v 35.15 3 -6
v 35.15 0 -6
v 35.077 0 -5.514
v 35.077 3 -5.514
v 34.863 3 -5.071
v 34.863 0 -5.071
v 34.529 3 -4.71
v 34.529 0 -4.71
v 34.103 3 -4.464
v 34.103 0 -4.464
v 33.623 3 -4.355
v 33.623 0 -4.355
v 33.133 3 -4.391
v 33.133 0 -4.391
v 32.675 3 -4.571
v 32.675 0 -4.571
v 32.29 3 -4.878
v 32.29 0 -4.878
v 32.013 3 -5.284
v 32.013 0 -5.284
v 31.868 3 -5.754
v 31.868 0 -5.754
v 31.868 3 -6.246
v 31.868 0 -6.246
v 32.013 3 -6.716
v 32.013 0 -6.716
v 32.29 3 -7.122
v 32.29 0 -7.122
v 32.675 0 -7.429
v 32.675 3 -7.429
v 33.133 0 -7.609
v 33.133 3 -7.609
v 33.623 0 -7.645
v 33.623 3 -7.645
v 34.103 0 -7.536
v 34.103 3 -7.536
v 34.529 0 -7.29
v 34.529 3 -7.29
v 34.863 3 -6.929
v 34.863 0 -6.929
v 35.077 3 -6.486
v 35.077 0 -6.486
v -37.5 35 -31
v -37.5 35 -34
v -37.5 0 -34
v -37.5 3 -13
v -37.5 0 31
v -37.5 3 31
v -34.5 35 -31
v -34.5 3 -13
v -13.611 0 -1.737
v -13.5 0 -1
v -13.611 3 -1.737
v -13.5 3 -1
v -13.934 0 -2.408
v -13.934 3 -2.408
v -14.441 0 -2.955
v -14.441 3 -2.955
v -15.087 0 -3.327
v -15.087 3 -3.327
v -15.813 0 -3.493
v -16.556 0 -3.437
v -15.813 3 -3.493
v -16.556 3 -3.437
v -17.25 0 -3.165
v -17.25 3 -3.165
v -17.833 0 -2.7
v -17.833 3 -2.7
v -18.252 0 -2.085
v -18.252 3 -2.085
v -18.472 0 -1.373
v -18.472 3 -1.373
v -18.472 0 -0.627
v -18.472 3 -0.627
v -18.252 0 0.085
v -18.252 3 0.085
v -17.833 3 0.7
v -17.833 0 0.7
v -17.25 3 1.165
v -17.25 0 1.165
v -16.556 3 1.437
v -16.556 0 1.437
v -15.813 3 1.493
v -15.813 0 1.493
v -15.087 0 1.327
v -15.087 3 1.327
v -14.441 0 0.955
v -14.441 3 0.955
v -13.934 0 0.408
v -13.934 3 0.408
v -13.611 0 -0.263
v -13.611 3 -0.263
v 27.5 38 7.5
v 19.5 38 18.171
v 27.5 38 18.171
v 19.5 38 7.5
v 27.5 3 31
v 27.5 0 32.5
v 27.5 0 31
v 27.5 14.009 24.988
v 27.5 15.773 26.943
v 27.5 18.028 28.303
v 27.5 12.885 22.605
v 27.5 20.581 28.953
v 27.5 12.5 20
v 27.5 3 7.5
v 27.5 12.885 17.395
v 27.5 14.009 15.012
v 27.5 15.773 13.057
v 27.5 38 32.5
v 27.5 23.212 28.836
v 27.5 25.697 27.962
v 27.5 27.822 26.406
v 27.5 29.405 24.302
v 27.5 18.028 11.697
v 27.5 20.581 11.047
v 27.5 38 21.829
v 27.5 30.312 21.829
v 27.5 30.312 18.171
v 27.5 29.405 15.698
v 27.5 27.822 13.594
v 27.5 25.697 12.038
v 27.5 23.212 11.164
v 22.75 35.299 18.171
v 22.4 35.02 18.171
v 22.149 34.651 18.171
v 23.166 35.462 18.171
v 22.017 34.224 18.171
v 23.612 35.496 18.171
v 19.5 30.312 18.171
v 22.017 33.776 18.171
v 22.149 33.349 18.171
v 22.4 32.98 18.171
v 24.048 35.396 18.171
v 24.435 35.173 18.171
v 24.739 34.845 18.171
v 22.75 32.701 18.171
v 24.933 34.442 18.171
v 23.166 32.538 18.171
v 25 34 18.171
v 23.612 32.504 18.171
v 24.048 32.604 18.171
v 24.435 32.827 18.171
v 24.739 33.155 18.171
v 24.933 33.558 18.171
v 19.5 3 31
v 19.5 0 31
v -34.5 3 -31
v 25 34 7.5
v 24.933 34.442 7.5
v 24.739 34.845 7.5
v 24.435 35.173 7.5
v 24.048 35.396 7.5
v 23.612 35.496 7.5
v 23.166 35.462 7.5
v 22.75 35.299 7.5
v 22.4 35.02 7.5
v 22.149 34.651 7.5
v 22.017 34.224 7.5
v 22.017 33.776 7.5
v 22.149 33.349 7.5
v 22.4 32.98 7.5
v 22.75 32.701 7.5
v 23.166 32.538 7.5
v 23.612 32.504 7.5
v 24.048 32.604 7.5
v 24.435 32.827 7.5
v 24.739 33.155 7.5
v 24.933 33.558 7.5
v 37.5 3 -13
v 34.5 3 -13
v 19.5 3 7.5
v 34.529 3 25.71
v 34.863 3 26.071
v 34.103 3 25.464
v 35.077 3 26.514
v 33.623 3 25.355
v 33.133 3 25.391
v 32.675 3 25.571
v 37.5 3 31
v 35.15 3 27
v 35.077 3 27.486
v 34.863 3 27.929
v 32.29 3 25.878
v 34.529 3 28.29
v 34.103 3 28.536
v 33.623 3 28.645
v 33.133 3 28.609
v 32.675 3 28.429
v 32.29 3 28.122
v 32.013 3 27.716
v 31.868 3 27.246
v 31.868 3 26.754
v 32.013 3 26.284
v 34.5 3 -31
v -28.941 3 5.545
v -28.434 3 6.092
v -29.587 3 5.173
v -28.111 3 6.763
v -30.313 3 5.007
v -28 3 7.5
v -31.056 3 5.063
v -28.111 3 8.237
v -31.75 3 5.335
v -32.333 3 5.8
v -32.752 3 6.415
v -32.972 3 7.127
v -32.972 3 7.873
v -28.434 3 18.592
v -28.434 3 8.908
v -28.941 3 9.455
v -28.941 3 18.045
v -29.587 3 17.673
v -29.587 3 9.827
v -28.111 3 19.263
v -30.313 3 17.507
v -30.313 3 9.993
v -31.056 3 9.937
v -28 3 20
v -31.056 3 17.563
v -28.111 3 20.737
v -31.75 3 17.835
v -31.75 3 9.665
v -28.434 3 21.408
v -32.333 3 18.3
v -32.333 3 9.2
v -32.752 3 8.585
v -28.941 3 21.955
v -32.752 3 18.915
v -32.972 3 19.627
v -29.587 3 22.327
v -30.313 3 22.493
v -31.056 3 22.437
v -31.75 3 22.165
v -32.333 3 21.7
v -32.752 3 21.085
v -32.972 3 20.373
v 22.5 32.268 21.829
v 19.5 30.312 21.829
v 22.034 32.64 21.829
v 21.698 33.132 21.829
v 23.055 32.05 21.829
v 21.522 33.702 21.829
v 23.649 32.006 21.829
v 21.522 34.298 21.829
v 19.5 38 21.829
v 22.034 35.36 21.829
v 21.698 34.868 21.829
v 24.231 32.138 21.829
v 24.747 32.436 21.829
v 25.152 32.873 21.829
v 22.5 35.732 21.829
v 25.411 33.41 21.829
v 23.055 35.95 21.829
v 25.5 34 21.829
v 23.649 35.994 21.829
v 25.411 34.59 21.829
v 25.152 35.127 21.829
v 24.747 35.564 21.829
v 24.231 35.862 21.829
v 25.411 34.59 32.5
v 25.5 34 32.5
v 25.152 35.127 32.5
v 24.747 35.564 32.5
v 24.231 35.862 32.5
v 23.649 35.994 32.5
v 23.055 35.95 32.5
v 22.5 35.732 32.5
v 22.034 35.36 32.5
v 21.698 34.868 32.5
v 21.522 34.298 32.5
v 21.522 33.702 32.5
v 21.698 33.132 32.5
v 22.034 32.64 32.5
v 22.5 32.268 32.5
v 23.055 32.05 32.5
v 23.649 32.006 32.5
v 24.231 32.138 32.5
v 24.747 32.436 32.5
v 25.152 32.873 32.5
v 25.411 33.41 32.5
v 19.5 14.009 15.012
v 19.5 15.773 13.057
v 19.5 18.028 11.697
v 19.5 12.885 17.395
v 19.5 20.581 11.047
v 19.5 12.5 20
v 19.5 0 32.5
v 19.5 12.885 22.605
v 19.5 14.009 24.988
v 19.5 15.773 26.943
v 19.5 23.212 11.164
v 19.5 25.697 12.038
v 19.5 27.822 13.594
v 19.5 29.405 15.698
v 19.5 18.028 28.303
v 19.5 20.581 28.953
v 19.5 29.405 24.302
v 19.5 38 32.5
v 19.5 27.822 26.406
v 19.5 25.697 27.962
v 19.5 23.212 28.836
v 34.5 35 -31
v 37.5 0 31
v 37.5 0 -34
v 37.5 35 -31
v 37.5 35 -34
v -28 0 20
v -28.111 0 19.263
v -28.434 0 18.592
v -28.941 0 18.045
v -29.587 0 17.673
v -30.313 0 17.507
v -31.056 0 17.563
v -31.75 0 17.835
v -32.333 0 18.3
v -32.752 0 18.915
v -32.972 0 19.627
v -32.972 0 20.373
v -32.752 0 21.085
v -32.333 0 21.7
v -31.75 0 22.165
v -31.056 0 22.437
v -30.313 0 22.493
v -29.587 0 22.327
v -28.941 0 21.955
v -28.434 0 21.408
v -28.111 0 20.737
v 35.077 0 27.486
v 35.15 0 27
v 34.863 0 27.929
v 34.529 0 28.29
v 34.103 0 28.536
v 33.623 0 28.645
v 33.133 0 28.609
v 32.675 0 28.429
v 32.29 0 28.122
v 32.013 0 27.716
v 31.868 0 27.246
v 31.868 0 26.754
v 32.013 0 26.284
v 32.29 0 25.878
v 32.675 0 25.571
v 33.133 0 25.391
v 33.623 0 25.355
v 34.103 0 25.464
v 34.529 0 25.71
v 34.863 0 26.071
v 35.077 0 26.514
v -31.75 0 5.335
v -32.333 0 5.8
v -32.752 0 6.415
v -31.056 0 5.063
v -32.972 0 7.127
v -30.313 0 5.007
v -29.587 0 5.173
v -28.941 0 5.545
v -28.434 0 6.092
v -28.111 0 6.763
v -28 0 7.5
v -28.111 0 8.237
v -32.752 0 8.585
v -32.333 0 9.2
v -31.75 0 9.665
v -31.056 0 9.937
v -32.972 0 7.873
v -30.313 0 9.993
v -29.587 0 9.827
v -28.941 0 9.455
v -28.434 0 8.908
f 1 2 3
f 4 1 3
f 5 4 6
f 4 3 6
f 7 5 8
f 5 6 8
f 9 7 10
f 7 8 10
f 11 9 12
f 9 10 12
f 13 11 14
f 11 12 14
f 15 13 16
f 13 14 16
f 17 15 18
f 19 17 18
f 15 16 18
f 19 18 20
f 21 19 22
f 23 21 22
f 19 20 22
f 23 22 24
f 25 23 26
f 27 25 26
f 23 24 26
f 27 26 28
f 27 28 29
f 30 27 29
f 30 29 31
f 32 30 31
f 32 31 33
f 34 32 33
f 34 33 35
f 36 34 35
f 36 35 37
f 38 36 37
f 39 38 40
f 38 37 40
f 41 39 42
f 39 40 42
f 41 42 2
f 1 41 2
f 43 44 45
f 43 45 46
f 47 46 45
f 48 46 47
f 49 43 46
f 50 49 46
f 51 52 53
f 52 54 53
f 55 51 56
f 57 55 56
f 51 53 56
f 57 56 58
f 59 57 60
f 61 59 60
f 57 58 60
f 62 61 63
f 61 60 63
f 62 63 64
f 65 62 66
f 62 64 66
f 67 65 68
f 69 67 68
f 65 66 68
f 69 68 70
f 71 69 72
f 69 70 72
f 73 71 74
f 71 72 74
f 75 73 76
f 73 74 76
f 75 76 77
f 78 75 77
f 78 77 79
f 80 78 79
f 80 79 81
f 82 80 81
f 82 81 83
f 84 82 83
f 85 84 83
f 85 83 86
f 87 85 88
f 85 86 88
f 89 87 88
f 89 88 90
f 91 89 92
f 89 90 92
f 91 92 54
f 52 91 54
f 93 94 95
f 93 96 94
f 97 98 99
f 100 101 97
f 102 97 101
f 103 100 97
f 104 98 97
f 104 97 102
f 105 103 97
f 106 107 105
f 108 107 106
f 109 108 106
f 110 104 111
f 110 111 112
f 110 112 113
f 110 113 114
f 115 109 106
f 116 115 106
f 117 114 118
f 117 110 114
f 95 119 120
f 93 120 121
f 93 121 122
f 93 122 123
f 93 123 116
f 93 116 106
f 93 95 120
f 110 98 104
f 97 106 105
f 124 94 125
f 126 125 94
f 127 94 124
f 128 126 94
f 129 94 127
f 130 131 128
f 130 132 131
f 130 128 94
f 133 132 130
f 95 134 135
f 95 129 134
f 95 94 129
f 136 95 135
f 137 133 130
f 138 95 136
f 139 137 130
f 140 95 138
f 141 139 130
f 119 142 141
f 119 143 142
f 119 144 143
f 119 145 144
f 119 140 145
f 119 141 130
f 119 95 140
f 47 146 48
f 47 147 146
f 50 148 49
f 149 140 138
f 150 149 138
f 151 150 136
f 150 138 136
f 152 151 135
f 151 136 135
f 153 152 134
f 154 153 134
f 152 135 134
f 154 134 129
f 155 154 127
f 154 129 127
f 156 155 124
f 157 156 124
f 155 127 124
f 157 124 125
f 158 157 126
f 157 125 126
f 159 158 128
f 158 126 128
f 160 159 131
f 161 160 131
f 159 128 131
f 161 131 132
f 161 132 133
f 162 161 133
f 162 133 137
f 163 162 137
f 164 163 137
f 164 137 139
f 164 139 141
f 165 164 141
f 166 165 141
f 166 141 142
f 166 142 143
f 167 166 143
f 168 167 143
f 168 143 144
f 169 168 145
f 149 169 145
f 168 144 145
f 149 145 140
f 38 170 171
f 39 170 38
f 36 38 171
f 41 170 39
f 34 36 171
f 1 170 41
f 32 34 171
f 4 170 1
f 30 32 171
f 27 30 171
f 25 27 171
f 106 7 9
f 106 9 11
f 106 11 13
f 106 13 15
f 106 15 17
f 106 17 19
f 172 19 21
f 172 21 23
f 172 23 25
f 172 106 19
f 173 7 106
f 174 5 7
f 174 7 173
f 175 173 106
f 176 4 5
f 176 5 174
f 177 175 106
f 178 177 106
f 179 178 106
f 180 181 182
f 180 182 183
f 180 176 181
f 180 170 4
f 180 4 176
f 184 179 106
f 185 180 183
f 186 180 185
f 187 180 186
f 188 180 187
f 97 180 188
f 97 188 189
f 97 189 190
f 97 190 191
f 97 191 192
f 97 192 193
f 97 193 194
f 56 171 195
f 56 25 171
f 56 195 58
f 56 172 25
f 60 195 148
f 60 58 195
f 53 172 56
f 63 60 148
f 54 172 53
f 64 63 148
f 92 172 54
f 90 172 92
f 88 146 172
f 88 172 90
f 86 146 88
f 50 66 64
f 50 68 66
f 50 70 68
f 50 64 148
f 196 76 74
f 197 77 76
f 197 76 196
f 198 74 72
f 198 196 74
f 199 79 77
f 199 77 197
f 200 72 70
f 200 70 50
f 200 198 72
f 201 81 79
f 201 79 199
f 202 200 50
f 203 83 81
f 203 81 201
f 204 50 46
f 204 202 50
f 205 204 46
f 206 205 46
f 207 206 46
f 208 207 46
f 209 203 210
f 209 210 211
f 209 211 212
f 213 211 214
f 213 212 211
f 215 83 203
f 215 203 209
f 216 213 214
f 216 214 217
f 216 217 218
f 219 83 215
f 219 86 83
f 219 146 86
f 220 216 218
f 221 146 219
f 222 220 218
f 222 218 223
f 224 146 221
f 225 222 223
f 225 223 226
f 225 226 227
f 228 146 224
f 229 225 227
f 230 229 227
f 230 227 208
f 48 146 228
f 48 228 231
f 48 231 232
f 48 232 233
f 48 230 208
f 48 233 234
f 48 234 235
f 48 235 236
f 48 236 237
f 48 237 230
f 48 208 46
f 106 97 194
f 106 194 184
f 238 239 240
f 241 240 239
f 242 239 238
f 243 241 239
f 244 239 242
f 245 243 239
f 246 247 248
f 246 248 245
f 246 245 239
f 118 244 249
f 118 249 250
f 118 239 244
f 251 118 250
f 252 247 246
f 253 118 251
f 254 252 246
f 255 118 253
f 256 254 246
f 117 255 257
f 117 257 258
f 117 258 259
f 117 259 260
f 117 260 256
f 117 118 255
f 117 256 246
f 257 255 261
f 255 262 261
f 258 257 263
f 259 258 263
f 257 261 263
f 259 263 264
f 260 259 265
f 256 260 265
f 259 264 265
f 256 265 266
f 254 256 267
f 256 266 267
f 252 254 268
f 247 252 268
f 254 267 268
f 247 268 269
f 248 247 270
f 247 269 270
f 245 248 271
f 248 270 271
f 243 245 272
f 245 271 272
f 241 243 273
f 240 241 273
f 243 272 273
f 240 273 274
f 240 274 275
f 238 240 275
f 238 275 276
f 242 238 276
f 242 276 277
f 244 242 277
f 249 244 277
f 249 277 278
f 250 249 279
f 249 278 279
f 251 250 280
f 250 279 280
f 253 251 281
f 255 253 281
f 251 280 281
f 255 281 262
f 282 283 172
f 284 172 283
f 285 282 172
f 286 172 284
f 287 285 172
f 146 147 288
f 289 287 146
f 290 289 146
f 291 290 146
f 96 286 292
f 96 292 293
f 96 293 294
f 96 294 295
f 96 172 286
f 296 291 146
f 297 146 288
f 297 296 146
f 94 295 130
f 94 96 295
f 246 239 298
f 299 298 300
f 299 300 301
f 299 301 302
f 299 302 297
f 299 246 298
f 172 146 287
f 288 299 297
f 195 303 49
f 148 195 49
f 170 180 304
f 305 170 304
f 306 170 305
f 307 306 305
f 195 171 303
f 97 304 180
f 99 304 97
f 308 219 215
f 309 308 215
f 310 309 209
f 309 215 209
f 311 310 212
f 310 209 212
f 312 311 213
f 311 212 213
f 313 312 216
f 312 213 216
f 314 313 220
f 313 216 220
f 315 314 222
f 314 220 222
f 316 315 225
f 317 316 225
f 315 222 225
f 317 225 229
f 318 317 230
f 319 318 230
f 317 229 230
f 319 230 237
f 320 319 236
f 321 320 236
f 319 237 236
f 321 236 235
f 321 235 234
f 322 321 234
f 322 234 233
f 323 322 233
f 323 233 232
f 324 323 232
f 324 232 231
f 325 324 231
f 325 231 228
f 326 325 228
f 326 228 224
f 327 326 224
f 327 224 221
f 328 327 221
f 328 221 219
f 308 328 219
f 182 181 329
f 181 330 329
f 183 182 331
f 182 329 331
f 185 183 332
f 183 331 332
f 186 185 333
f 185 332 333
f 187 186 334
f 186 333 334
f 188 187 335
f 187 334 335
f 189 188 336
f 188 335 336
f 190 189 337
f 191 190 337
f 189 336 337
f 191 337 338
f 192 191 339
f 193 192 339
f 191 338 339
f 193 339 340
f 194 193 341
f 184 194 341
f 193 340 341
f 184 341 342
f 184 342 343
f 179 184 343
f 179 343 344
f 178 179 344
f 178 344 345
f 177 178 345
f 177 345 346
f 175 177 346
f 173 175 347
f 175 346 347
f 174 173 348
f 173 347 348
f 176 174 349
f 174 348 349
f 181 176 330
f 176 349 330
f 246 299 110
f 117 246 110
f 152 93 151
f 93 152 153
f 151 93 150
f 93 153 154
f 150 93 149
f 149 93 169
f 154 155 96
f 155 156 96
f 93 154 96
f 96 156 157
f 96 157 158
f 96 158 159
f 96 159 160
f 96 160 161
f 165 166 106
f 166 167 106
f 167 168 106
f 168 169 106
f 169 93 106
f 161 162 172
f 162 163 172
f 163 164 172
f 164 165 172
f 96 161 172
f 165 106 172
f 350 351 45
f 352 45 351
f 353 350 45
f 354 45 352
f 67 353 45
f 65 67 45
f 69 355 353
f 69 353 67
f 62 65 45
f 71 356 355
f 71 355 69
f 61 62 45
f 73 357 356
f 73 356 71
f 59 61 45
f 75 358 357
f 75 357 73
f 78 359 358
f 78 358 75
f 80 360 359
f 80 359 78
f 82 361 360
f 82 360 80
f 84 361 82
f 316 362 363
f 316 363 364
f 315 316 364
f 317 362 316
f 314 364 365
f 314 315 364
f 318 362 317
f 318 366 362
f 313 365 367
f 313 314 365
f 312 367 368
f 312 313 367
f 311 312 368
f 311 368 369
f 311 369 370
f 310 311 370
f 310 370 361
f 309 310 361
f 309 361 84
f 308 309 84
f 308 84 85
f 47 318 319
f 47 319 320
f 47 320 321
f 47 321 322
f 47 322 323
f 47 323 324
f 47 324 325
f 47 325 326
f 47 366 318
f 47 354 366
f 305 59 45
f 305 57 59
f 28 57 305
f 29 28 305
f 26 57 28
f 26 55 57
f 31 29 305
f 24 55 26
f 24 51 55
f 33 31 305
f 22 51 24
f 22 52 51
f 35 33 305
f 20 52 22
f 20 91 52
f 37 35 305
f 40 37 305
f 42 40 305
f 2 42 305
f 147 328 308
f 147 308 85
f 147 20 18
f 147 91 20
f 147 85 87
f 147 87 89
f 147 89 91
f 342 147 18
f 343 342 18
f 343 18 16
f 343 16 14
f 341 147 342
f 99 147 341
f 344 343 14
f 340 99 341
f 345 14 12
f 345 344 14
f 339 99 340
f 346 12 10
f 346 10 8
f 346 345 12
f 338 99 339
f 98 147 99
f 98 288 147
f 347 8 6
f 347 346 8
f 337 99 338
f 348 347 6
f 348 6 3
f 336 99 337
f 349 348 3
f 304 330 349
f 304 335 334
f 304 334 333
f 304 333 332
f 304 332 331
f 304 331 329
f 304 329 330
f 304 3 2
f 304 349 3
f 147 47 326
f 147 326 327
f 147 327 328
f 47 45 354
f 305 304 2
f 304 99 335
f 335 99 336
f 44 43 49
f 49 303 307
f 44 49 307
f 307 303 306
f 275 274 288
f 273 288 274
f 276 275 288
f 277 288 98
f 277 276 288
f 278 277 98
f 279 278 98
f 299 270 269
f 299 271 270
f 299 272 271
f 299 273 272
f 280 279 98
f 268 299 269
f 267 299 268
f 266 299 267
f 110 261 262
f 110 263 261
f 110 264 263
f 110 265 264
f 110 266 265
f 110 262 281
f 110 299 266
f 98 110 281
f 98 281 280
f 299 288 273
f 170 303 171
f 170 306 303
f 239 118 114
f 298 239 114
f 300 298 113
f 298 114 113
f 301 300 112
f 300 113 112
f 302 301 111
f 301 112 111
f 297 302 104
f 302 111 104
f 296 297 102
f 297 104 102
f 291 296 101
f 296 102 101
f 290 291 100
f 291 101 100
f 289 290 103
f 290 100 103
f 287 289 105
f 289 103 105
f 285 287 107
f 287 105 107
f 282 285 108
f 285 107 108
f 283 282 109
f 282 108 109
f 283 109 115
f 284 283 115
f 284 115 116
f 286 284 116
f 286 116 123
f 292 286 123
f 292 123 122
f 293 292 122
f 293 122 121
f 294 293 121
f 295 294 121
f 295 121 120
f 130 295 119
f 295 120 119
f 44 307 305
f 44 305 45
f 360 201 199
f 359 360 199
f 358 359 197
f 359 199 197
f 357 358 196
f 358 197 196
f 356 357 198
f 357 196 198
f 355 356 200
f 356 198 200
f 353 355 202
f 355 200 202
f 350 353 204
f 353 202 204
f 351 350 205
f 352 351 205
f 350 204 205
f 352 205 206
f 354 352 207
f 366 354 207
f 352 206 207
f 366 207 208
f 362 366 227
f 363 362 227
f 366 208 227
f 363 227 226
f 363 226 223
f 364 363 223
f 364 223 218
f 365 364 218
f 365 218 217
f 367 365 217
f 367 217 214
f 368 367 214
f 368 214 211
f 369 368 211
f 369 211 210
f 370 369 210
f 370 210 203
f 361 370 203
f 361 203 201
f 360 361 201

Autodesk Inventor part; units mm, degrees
ref_plane "YZ Plane" through (0, 0, 0) normal (1, 0, 0) x (0, 1, 0)
ref_plane "XZ Plane" through (0, 0, 0) normal (0, 1, 0) x (-1, 0, 0)
ref_plane "XY Plane" through (0, 0, 0) normal (0, 0, 1) x (1, 0, 0)
sketch "Sketch1" plane through (0, 0, 0) normal (0, 1, 0) x (-1, 0, 0)
  line L0 (37.5, -31) -> (-37.5, -31)
  line L1 (-37.5, -31) -> (-37.5, 31)
  line L2 (-37.5, 31) -> (37.5, 31)
  line L3 (37.5, 31) -> (37.5, -31)
  line L4 (37.5, -31) -> (-37.5, 31) construction
  line L5 (-37.5, -31) -> (37.5, 31) construction
  point P0 (0, 0)
  dimension "d0" = 75
  dimension "d1" = 62
extrude "Extrusion1" add sketch "Sketch1" along normal blind 3
sketch "Sketch2" plane through (0, 3, 0) normal (0, 1, 0) x (1, 0, 0)
  line L0 (37.5, 31) -> (-37.5, 31) projected
  line L1 (-37.5, 31) -> (-37.5, -31) projected
  circle A0 centre (-30.5, -7.5) radius 2.5
  circle A1 centre (-30.5, -20) radius 2.5
  circle A2 centre (-16, 1) radius 2.5
  line L2 (-37.5, -31) -> (37.5, -31) projected
  line L3 (37.5, -31) -> (37.5, 31) projected
  line L4 (-30.5, -7.5) -> (-30.5, -31)
  point P0 (0, 0)
  dimension "d4" = 5
  dimension "d5" = 5
  dimension "d6" = 12.5
  dimension "d7" = 7
  dimension "d8" = 5
  dimension "d9" = 8.5
  dimension "d10" = 14.5
  dimension "d11" = 30
extrude "Extrusion2" cut sketch "Sketch2" against normal through all contours A0 | A1 L4 | L4 A1 | A2
sketch "Sketch3" plane through (0, 3, 0) normal (0, 1, 0) x (1, 0, 0)
  line L0 (-37.5, 31) -> (-37.5, -31) projected
  line L1 (37.5, -31) -> (37.5, 31) projected
  line L2 (-37.5, -20) -> (37.5, -20)
  line L3 (19.5, -32.5) -> (27.5, -32.5)
  line L4 (27.5, -32.5) -> (27.5, -7.5)
  line L5 (27.5, -7.5) -> (19.5, -7.5)
  line L6 (19.5, -7.5) -> (19.5, -32.5)
  line L7 (19.5, -32.5) -> (27.5, -7.5) construction
  line L8 (27.5, -32.5) -> (19.5, -7.5) construction
  circle A0 centre (-30.5, -20) radius 2.5 projected
  point P0 (0, 0)
  point P1 (23.5, -20)
  dimension "d16" = 8
  dimension "d21" = 25
  dimension "d22" = 0
  dimension "d74" = 50
extrude "Extrusion3" add sketch "Sketch3" along normal blind 35 contours L6 L5 L4 L2 | L2 L4 L3 L6
sketch "Sketch4" plane through (27.5, 3, 32.5) normal (1, 0, 0) x (0, 0, -1)
  line L0 (25, 0) -> (1.5, 0) projected
  circle A0 centre (12.5, 18.5) radius 9
  line L1 (0, 35) -> (25, 35) projected
  line L2 (10.6712, 35) -> (14.3288, 35)
  line L3 (14.3288, 35) -> (14.3288, 27.3122)
  line L4 (14.3288, 27.3122) -> (10.6712, 27.3122)
  line L5 (10.6712, 27.3122) -> (10.6712, 35)
  line L6 (12.5, 35) -> (12.5, 0)
  line L7 (16.7228, 27.2139) -> (8.2773, 27.2139)
  line L8 (8.2773, 27.2139) -> (8.2773, 30.5)
  line L9 (8.2773, 30.5) -> (16.7228, 30.5)
  line L10 (16.7228, 30.5) -> (16.7228, 27.2139)
  line L11 (16.7228, 27.2139) -> (8.2773, 30.5) construction
  line L12 (8.2773, 27.2139) -> (16.7228, 30.5) construction
  point P0 (0, 0)
  point P1 (32.5, -3)
  point P2 (12.5, 28.8569)
  dimension "d86" = 18
  dimension "d87" = 18.5
  dimension "d88" = 3.6576
  dimension "d89" = 8.4455
  dimension "d90" = 3.2861
  dimension "d91" = 4.5
extrude "Extrusion4" cut sketch "Sketch4" against normal up to surface (8 mm away) contours A0 L6 L7 | L7 L6 L4 A0 | A0 L7 L6 | L4 L6 A0 | A0 L6 L9 L3 | L7 A0 L4 L6 | L6 L4 A0 | A0 L5 L9 L6 | L9 L6 L1 L3 | L9 L5 L1 L6
sketch "Sketch10" plane through (19.5, 3, 32.5) normal (0, 0, 1) x (1, 0, 0)
  circle A0 centre (4, 31) radius 1.5
  point P0 (6, -5)
  dimension "d49" = 3
sketch "Sketch9" plane through (19.5, 3, 32.5) normal (0, 0, 1) x (1, 0, 0)
  circle A0 centre (4, 31) radius 2
  point P0 (6, -5)
  dimension "d48" = 4
extrude "Extrusion9" cut sketch "Sketch10" against normal through all
extrude "Extrusion10" cut sketch "Sketch9" against normal up to surface (14.3288 mm away)
sketch "Sketch13" plane through (37.5, 0, -31) normal (0, 0, -1) x (-1, 0, 0)
  line L0 (75, 0) -> (75, 3) projected
  line L1 (0, 0) -> (75, 0)
  line L2 (75, 0) -> (75, 35)
  line L3 (75, 35) -> (0, 35)
  line L4 (0, 35) -> (0, 0)
  point P0 (37.5, 0)
  dimension "d71" = 35
extrude "Extrusion13" add sketch "Sketch13" along normal blind 3
sketch "Sketch14" plane through (0, 0, 0) normal (0, -1, 0) x (1, 0, 0)
  circle A0 centre (21, 27) radius 1.65
  circle A1 centre (33.5, 27) radius 1.65
  line L0 (33.5, 27) -> (21, 27)
  line L1 (21, 27) -> (21, -6)
  line L2 (21, -6) -> (33.5, -6)
  line L3 (33.5, -6) -> (33.5, 27)
  circle A2 centre (21, -6) radius 1.65
  circle A3 centre (33.5, -6) radius 1.65
  line L4 (37.5, -34) -> (37.5, 31) projected
  point P0 (0, 0)
  point P1 (37.5, -31)
  dimension "d75" = 12.5
  dimension "d76" = 3.3
  dimension "d77" = 3.3
  dimension "d78" = 3.3
  dimension "d79" = 3.3
  dimension "d81" = 33
  dimension "d82" = 25
  dimension "d93" = 4
extrude "Extrusion14" cut sketch "Sketch14" against normal up to next contours L0 L3 A1 | A1 L3 L0 | A3 L2 L3 | L3 L2 A3
sketch "Sketch15" plane through (37.5, 0, 31) normal (1, 0, 0) x (0, 0, -1)
  line L0 (62, 35) -> (62, 3) projected
  line L1 (0, 3) -> (62, 3) projected
  line L2 (62, 35) -> (44, 3)
  point P0 (31, 0)
  dimension "d94" = 18
extrude "Extrusion15" add sketch "Sketch15" against normal blind 3
sketch "Sketch16" plane through (-37.5, 0, 31) normal (-1, 0, 0) x (0, 0, 1)
  line L0 (-62, 3) -> (0, 3) projected
  line L1 (-62, 3) -> (-62, 35) projected
  line L2 (-62, 35) -> (-44, 3)
  point P0 (-31, 0)
  dimension "d97" = 18
extrude "Extrusion16" add sketch "Sketch16" against normal blind 3
sketch "Sketch17" plane through (0, 3, 0) normal (0, -1, 0) x (1, 0, 0)
  line L0 (19.5, 31) -> (27.5, 31) projected
  line L1 (27.5, 32.5) -> (27.5, 31) projected
  line L2 (19.5, 32.5) -> (27.5, 32.5) projected
  line L3 (19.5, 31) -> (19.5, 32.5) projected
  point P0 (0, 0)
extrude "Extrusion17" add sketch "Sketch17" along normal up to surface (3 mm away)
equation "\"d88\" = tslot_screw_width"
equation "\"d89\" = tslot_nut_width"
equation "\"d90\" = tslot_nut_thickness"
equation "\"Acrylic_thickness\" = 3.175"
equation "\"Wood_thickness\" = 5"
equation "\"Acrylic_kerf\" = 0"
equation "\"Wood_kerf\" = 0"
equation "\"resevoir_thickness\" = 12.7"
equation "\"acrylic_height\" = 304.8"
equation "\"acrylic_stopper\" = 125"
equation "\"arm_width\" = 25.4"
equation "\"arm_thickness\" = 1.5875"
equation "\"arm_length\" = 224.5"
equation "\"ball_joint_from_arm\" = 14.5"
equation "\"z_railA_from_screw\" = 35"
equation "\"z_railB_from_screw\" = 35"
equation "\"z_rail_D\" = 8"
equation "\"z_rail_support_hole\" = 5"
equation "\"z_screw_D\" = 8"
equation "\"lmk8uu_hole_space\" = 17"
equation "\"lmk8uu_hole_D\" = 3.3"
equation "\"lmk8uu_OD\" = 15"
equation "\"camera_arm_screw\" = 6.35"
equation "\"carrier_thickness\" = 5"
equation "\"turntable_ID\" = 145"
equation "\"turntable_outside_hole_radius\" = 92.72"
equation "\"turntable_inside_hole_radius\" = 79.16"
equation "\"turntable_hole_D\" = 5.6"
equation "\"oring_ID\" = 19.05"
equation "\"oring_OD\" = 23.8125"
equation "\"drive_set_screw\" = 2.5"
equation "\"drive_set_nut\" = 5"
equation "\"nema17_hole_D\" = 3.3"
equation "\"nema17_hole_space\" = 31"
equation "\"box_lid_from_back\" = 147.5"
equation "\"box_lid_slot_length\" = 0"
equation "\"mirror_thickness\" = 8"
equation "\"laser_angle\" = 25deg"
equation "\"laser_distance\" = 155.47675"
equation "\"m8_rail_height\" = 304.8"
equation "\"print_bed_drill\" = 7.9375"
equation "\"front_frame_inset\" = 28.04"
equation "\"petri_OD\" = 152.4"
equation "\"tslot_screw_length\" = 12.7"
equation "\"tslot_screw_width\" = 3.6576"
equation "\"tslot_nut_width\" = 8.4455"
equation "\"tslot_nut_thickness\" = 3.28612"
equation "\"center_frame_inset\" = 186.36"
equation "\"printer_z\" = 289"
equation "\"frame_tilt\" = 1deg"
equation "\"z_min_from_center\" = 72.6"
equation "\"crane_z\" = 25"
equation "\"tape_thickness\" = 2"
equation "\"tape_keep_out\" = 2"
equation "\"brass_keep_out\" = 8"
equation "\"crane_x\" = 245.2"
equation "\"brass_insert_drill\" = 4"
equation "\"bed_clamp_border\" = 15"
equation "\"tray_boarder\" = 15"
equation "\"motor_spacing\" = 296"
equation "\"threaded_rod_z\" = 203.2"
equation "\"linear_bearing_z\" = 304.8"
equation "\"clear_acrylic\" = 2"
equation "\"thin_acrylic\" = 3"
equation "\"carrier_z2\" = 283.6"
equation "\"carrier_z\" = 258.6"
equation "\"thick_acrylic\" = 5.6"
equation "\"linear_bearing_spacing\" = 216"
equation "\"laser_body_diameter\" = 12"
equation "\"stepper_body_diameter\" = 28"
equation "\"stepper_shaft_diameter\" = 5"
equation "\"m3_diameter\" = 3.15"
equation "\"stepper_screw_space\" = 35"
equation "\"m5_diameter\" = 5.25"
equation "\"subframe_y_offset\" = 27.5"
equation "\"laser_y_offset\" = 18.5"
equation "\"laser_diameter\" = 12"
equation "\"laser_y\" = 35"
equation "\"laser_z\" = 18"
properties part number "galvo holder" material "ABS Plastic"
